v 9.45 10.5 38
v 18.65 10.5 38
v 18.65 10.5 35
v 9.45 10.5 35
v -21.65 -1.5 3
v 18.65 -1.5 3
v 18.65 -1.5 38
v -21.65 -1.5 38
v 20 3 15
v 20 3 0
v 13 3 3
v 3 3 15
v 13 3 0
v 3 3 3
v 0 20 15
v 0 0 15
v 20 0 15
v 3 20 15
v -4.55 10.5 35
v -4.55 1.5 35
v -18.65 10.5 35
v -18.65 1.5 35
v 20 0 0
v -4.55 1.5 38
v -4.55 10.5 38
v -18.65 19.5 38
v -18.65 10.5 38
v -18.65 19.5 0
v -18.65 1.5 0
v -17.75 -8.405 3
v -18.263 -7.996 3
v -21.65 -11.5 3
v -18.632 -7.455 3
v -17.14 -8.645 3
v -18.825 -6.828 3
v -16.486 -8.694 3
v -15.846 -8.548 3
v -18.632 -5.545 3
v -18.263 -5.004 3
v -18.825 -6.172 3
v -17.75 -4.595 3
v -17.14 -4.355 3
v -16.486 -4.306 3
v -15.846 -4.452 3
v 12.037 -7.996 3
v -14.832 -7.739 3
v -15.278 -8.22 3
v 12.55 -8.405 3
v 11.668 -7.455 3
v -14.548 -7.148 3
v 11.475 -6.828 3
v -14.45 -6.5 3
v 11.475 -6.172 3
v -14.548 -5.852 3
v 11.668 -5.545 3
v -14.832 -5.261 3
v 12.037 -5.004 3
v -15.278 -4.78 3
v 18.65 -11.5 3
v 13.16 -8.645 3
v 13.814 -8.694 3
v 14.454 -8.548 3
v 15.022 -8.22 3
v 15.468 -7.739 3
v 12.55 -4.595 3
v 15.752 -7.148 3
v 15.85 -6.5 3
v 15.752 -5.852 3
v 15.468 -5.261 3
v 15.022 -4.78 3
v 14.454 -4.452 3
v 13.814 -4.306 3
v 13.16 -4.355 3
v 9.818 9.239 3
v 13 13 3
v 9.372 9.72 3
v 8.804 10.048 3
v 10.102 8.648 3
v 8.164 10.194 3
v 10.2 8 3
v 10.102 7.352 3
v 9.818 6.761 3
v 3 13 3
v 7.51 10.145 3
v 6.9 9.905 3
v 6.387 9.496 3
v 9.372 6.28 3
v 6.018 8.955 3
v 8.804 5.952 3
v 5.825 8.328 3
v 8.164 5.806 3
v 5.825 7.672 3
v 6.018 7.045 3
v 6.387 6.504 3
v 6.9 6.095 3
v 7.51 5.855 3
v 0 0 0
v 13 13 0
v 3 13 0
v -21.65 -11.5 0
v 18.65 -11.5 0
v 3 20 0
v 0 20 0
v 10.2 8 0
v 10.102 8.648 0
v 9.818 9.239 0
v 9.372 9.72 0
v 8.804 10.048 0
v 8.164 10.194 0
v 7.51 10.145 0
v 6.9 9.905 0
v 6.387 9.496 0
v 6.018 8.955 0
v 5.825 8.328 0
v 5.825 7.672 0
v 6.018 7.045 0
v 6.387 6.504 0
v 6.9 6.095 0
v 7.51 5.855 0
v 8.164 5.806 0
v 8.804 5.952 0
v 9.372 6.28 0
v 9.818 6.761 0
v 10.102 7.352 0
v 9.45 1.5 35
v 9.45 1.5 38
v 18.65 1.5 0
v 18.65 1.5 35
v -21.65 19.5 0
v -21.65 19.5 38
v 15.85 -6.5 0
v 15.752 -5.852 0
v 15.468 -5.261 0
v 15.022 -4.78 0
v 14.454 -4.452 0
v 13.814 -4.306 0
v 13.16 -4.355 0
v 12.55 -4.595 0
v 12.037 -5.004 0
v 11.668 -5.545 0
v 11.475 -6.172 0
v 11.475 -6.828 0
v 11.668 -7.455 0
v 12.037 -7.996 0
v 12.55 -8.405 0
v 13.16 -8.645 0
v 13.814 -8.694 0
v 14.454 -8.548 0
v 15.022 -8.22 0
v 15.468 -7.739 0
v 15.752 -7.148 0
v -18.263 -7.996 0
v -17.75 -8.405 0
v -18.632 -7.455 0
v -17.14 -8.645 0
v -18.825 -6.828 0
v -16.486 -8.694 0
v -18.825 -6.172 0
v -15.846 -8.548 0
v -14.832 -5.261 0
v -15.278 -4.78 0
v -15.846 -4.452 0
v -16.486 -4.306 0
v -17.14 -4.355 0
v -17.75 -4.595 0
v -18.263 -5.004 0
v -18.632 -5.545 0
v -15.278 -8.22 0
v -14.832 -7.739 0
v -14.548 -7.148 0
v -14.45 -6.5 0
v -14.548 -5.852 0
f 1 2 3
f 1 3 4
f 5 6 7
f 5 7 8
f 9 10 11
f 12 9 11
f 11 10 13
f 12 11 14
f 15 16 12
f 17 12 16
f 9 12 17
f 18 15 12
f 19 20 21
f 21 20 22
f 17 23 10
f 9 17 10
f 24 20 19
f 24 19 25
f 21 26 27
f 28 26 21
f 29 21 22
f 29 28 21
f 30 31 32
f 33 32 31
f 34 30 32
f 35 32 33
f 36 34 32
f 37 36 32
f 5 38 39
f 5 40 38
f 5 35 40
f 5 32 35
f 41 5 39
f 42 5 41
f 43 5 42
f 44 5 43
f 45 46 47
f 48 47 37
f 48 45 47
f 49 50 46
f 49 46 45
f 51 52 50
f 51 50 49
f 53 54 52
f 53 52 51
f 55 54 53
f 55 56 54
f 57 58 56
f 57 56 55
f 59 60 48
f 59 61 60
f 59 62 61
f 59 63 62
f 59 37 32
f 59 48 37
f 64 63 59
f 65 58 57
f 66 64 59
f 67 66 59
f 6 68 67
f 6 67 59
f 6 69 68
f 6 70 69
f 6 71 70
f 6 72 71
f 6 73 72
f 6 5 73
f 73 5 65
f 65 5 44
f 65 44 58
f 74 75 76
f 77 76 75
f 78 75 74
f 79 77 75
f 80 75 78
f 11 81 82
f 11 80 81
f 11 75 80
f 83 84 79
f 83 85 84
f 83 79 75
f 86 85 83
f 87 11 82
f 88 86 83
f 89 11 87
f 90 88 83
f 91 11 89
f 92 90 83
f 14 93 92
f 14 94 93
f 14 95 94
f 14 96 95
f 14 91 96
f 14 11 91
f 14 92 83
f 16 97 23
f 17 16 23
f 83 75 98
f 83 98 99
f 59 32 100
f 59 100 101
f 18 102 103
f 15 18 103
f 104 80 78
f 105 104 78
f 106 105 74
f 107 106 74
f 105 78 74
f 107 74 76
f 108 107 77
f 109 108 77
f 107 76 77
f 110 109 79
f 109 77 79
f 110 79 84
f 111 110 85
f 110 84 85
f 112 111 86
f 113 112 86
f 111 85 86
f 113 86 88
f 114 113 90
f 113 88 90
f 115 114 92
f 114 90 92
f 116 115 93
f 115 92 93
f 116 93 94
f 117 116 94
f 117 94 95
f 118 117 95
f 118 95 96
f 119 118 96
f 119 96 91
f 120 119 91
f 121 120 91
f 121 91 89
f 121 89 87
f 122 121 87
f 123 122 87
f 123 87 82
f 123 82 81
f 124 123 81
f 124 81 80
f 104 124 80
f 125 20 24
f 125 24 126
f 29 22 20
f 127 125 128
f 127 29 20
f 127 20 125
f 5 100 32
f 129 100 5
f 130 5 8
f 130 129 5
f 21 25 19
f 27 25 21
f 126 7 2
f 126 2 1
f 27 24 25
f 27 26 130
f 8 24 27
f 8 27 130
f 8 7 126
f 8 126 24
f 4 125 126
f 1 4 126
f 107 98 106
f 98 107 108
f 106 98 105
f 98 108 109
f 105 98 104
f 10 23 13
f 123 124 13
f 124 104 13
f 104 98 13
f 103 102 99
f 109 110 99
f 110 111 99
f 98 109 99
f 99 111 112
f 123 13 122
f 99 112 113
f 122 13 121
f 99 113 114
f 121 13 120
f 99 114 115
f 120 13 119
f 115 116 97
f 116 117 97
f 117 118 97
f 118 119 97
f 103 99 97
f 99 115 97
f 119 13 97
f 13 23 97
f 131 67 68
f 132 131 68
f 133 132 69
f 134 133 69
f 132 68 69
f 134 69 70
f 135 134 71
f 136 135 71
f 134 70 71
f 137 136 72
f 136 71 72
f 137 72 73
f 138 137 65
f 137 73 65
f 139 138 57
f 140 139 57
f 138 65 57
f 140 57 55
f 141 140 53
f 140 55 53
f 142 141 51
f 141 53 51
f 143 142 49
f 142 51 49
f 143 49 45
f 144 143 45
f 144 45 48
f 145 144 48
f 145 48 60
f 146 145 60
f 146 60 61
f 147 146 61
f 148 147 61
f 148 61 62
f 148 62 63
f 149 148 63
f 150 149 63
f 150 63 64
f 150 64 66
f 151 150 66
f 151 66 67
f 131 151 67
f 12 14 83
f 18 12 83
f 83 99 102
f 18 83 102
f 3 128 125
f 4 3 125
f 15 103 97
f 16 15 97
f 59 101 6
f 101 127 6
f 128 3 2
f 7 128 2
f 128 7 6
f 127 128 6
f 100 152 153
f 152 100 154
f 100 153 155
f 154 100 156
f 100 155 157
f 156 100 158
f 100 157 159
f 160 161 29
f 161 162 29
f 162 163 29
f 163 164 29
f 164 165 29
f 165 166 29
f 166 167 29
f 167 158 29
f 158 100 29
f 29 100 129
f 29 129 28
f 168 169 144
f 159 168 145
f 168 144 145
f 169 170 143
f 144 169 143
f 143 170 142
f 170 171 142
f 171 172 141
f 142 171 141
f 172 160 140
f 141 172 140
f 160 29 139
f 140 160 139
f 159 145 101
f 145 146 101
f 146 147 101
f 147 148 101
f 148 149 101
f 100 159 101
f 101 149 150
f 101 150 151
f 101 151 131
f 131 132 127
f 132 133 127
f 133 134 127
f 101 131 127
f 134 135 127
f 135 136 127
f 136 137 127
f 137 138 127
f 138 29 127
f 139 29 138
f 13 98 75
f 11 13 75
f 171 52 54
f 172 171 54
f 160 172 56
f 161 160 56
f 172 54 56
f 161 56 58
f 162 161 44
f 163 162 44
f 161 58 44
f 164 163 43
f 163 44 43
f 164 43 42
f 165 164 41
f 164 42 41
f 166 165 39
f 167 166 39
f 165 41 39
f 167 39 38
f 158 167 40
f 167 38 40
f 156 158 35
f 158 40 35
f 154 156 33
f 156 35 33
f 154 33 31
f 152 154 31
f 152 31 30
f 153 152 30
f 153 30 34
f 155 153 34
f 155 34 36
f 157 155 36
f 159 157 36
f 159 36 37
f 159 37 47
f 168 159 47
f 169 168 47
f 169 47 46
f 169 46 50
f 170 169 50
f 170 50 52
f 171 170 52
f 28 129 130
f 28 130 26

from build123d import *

# Parameters (mm, degrees)
PAD_DEPTH     = 38
SKETCH001_W   = 9.2
SKETCH001_H   = 3
SKETCH001_W_2 = 14.1
PAD001_DEPTH  = 9
SKETCH002_W   = 40.3
SKETCH002_H   = 3
PAD002_DEPTH  = 10
SKETCH003_R   = 2.2
HOLE_DEPTH    = 3.001
PAD003_DEPTH  = 15
SKETCH005_W   = 10
SKETCH005_H   = 3
PAD004_DEPTH  = 10
SKETCH006_R   = 2.2
HOLE001_DEPTH = 25


with BuildPart() as mount1:
    # Sketch → Pad (new body)
    with BuildSketch(Plane.XY):
        Polygon((-18.65, 1.5), (18.65, 1.5), (18.65, -1.5), (-21.65, -1.5), (-21.65, 19.5), (-18.65, 19.5), align=None)
    extrude(amount=PAD_DEPTH)

    # Sketch001 (on Face1 of Pad) → Pad001 (join)
    with BuildSketch(Plane(origin=(0, 1.5, 0), x_dir=(-1, 0, 0), z_dir=(0, 1, 0))):
        with Locations((-14.05, 36.5)):
            Rectangle(SKETCH001_W, SKETCH001_H)
        with Locations((11.6, 36.5)):
            Rectangle(SKETCH001_W_2, SKETCH001_H)
    extrude(amount=PAD001_DEPTH)

    # Sketch002 (on Face10 of Pad001) → Pad002 (join)
    with BuildSketch(Plane.XZ.offset(1.5)):
        with Locations((-1.5, 1.5)):
            Rectangle(SKETCH002_W, SKETCH002_H)
    extrude(amount=PAD002_DEPTH)

    # Sketch003 (on Face22 of Pad002) → Hole (cut, through all)
    with BuildSketch(Plane.XY.offset(3)):
        with Locations((-16.65, -6.5)):
            Circle(SKETCH003_R)
        with Locations((13.65, -6.5)):
            Circle(SKETCH003_R)
    extrude(amount=-HOLE_DEPTH, mode=Mode.SUBTRACT)


with BuildPart() as mount2:
    # Sketch004 → Pad003 (new body)
    with BuildSketch(Plane.XY):
        Polygon((0, 20), (0, 0), (20, 0), (20, 3), (3, 3), (3, 20), align=None)
    extrude(amount=PAD003_DEPTH)

    # Sketch005 (on Face4 of Pad003) → Pad004 (join)
    with BuildSketch(Plane(origin=(0, 3, 0), x_dir=(-1, 0, 0), z_dir=(0, 1, 0))):
        with Locations((-8, 1.5)):
            Rectangle(SKETCH005_W, SKETCH005_H)
    extrude(amount=PAD004_DEPTH)

    # Sketch006 (on Face10 of Pad004) → Hole001 (cut)
    with BuildSketch(Plane.XY.offset(3)):
        with Locations((8, 8)):
            Circle(SKETCH006_R)
    extrude(amount=-HOLE001_DEPTH, mode=Mode.SUBTRACT)


solid = Compound([mount1.part, mount2.part])
